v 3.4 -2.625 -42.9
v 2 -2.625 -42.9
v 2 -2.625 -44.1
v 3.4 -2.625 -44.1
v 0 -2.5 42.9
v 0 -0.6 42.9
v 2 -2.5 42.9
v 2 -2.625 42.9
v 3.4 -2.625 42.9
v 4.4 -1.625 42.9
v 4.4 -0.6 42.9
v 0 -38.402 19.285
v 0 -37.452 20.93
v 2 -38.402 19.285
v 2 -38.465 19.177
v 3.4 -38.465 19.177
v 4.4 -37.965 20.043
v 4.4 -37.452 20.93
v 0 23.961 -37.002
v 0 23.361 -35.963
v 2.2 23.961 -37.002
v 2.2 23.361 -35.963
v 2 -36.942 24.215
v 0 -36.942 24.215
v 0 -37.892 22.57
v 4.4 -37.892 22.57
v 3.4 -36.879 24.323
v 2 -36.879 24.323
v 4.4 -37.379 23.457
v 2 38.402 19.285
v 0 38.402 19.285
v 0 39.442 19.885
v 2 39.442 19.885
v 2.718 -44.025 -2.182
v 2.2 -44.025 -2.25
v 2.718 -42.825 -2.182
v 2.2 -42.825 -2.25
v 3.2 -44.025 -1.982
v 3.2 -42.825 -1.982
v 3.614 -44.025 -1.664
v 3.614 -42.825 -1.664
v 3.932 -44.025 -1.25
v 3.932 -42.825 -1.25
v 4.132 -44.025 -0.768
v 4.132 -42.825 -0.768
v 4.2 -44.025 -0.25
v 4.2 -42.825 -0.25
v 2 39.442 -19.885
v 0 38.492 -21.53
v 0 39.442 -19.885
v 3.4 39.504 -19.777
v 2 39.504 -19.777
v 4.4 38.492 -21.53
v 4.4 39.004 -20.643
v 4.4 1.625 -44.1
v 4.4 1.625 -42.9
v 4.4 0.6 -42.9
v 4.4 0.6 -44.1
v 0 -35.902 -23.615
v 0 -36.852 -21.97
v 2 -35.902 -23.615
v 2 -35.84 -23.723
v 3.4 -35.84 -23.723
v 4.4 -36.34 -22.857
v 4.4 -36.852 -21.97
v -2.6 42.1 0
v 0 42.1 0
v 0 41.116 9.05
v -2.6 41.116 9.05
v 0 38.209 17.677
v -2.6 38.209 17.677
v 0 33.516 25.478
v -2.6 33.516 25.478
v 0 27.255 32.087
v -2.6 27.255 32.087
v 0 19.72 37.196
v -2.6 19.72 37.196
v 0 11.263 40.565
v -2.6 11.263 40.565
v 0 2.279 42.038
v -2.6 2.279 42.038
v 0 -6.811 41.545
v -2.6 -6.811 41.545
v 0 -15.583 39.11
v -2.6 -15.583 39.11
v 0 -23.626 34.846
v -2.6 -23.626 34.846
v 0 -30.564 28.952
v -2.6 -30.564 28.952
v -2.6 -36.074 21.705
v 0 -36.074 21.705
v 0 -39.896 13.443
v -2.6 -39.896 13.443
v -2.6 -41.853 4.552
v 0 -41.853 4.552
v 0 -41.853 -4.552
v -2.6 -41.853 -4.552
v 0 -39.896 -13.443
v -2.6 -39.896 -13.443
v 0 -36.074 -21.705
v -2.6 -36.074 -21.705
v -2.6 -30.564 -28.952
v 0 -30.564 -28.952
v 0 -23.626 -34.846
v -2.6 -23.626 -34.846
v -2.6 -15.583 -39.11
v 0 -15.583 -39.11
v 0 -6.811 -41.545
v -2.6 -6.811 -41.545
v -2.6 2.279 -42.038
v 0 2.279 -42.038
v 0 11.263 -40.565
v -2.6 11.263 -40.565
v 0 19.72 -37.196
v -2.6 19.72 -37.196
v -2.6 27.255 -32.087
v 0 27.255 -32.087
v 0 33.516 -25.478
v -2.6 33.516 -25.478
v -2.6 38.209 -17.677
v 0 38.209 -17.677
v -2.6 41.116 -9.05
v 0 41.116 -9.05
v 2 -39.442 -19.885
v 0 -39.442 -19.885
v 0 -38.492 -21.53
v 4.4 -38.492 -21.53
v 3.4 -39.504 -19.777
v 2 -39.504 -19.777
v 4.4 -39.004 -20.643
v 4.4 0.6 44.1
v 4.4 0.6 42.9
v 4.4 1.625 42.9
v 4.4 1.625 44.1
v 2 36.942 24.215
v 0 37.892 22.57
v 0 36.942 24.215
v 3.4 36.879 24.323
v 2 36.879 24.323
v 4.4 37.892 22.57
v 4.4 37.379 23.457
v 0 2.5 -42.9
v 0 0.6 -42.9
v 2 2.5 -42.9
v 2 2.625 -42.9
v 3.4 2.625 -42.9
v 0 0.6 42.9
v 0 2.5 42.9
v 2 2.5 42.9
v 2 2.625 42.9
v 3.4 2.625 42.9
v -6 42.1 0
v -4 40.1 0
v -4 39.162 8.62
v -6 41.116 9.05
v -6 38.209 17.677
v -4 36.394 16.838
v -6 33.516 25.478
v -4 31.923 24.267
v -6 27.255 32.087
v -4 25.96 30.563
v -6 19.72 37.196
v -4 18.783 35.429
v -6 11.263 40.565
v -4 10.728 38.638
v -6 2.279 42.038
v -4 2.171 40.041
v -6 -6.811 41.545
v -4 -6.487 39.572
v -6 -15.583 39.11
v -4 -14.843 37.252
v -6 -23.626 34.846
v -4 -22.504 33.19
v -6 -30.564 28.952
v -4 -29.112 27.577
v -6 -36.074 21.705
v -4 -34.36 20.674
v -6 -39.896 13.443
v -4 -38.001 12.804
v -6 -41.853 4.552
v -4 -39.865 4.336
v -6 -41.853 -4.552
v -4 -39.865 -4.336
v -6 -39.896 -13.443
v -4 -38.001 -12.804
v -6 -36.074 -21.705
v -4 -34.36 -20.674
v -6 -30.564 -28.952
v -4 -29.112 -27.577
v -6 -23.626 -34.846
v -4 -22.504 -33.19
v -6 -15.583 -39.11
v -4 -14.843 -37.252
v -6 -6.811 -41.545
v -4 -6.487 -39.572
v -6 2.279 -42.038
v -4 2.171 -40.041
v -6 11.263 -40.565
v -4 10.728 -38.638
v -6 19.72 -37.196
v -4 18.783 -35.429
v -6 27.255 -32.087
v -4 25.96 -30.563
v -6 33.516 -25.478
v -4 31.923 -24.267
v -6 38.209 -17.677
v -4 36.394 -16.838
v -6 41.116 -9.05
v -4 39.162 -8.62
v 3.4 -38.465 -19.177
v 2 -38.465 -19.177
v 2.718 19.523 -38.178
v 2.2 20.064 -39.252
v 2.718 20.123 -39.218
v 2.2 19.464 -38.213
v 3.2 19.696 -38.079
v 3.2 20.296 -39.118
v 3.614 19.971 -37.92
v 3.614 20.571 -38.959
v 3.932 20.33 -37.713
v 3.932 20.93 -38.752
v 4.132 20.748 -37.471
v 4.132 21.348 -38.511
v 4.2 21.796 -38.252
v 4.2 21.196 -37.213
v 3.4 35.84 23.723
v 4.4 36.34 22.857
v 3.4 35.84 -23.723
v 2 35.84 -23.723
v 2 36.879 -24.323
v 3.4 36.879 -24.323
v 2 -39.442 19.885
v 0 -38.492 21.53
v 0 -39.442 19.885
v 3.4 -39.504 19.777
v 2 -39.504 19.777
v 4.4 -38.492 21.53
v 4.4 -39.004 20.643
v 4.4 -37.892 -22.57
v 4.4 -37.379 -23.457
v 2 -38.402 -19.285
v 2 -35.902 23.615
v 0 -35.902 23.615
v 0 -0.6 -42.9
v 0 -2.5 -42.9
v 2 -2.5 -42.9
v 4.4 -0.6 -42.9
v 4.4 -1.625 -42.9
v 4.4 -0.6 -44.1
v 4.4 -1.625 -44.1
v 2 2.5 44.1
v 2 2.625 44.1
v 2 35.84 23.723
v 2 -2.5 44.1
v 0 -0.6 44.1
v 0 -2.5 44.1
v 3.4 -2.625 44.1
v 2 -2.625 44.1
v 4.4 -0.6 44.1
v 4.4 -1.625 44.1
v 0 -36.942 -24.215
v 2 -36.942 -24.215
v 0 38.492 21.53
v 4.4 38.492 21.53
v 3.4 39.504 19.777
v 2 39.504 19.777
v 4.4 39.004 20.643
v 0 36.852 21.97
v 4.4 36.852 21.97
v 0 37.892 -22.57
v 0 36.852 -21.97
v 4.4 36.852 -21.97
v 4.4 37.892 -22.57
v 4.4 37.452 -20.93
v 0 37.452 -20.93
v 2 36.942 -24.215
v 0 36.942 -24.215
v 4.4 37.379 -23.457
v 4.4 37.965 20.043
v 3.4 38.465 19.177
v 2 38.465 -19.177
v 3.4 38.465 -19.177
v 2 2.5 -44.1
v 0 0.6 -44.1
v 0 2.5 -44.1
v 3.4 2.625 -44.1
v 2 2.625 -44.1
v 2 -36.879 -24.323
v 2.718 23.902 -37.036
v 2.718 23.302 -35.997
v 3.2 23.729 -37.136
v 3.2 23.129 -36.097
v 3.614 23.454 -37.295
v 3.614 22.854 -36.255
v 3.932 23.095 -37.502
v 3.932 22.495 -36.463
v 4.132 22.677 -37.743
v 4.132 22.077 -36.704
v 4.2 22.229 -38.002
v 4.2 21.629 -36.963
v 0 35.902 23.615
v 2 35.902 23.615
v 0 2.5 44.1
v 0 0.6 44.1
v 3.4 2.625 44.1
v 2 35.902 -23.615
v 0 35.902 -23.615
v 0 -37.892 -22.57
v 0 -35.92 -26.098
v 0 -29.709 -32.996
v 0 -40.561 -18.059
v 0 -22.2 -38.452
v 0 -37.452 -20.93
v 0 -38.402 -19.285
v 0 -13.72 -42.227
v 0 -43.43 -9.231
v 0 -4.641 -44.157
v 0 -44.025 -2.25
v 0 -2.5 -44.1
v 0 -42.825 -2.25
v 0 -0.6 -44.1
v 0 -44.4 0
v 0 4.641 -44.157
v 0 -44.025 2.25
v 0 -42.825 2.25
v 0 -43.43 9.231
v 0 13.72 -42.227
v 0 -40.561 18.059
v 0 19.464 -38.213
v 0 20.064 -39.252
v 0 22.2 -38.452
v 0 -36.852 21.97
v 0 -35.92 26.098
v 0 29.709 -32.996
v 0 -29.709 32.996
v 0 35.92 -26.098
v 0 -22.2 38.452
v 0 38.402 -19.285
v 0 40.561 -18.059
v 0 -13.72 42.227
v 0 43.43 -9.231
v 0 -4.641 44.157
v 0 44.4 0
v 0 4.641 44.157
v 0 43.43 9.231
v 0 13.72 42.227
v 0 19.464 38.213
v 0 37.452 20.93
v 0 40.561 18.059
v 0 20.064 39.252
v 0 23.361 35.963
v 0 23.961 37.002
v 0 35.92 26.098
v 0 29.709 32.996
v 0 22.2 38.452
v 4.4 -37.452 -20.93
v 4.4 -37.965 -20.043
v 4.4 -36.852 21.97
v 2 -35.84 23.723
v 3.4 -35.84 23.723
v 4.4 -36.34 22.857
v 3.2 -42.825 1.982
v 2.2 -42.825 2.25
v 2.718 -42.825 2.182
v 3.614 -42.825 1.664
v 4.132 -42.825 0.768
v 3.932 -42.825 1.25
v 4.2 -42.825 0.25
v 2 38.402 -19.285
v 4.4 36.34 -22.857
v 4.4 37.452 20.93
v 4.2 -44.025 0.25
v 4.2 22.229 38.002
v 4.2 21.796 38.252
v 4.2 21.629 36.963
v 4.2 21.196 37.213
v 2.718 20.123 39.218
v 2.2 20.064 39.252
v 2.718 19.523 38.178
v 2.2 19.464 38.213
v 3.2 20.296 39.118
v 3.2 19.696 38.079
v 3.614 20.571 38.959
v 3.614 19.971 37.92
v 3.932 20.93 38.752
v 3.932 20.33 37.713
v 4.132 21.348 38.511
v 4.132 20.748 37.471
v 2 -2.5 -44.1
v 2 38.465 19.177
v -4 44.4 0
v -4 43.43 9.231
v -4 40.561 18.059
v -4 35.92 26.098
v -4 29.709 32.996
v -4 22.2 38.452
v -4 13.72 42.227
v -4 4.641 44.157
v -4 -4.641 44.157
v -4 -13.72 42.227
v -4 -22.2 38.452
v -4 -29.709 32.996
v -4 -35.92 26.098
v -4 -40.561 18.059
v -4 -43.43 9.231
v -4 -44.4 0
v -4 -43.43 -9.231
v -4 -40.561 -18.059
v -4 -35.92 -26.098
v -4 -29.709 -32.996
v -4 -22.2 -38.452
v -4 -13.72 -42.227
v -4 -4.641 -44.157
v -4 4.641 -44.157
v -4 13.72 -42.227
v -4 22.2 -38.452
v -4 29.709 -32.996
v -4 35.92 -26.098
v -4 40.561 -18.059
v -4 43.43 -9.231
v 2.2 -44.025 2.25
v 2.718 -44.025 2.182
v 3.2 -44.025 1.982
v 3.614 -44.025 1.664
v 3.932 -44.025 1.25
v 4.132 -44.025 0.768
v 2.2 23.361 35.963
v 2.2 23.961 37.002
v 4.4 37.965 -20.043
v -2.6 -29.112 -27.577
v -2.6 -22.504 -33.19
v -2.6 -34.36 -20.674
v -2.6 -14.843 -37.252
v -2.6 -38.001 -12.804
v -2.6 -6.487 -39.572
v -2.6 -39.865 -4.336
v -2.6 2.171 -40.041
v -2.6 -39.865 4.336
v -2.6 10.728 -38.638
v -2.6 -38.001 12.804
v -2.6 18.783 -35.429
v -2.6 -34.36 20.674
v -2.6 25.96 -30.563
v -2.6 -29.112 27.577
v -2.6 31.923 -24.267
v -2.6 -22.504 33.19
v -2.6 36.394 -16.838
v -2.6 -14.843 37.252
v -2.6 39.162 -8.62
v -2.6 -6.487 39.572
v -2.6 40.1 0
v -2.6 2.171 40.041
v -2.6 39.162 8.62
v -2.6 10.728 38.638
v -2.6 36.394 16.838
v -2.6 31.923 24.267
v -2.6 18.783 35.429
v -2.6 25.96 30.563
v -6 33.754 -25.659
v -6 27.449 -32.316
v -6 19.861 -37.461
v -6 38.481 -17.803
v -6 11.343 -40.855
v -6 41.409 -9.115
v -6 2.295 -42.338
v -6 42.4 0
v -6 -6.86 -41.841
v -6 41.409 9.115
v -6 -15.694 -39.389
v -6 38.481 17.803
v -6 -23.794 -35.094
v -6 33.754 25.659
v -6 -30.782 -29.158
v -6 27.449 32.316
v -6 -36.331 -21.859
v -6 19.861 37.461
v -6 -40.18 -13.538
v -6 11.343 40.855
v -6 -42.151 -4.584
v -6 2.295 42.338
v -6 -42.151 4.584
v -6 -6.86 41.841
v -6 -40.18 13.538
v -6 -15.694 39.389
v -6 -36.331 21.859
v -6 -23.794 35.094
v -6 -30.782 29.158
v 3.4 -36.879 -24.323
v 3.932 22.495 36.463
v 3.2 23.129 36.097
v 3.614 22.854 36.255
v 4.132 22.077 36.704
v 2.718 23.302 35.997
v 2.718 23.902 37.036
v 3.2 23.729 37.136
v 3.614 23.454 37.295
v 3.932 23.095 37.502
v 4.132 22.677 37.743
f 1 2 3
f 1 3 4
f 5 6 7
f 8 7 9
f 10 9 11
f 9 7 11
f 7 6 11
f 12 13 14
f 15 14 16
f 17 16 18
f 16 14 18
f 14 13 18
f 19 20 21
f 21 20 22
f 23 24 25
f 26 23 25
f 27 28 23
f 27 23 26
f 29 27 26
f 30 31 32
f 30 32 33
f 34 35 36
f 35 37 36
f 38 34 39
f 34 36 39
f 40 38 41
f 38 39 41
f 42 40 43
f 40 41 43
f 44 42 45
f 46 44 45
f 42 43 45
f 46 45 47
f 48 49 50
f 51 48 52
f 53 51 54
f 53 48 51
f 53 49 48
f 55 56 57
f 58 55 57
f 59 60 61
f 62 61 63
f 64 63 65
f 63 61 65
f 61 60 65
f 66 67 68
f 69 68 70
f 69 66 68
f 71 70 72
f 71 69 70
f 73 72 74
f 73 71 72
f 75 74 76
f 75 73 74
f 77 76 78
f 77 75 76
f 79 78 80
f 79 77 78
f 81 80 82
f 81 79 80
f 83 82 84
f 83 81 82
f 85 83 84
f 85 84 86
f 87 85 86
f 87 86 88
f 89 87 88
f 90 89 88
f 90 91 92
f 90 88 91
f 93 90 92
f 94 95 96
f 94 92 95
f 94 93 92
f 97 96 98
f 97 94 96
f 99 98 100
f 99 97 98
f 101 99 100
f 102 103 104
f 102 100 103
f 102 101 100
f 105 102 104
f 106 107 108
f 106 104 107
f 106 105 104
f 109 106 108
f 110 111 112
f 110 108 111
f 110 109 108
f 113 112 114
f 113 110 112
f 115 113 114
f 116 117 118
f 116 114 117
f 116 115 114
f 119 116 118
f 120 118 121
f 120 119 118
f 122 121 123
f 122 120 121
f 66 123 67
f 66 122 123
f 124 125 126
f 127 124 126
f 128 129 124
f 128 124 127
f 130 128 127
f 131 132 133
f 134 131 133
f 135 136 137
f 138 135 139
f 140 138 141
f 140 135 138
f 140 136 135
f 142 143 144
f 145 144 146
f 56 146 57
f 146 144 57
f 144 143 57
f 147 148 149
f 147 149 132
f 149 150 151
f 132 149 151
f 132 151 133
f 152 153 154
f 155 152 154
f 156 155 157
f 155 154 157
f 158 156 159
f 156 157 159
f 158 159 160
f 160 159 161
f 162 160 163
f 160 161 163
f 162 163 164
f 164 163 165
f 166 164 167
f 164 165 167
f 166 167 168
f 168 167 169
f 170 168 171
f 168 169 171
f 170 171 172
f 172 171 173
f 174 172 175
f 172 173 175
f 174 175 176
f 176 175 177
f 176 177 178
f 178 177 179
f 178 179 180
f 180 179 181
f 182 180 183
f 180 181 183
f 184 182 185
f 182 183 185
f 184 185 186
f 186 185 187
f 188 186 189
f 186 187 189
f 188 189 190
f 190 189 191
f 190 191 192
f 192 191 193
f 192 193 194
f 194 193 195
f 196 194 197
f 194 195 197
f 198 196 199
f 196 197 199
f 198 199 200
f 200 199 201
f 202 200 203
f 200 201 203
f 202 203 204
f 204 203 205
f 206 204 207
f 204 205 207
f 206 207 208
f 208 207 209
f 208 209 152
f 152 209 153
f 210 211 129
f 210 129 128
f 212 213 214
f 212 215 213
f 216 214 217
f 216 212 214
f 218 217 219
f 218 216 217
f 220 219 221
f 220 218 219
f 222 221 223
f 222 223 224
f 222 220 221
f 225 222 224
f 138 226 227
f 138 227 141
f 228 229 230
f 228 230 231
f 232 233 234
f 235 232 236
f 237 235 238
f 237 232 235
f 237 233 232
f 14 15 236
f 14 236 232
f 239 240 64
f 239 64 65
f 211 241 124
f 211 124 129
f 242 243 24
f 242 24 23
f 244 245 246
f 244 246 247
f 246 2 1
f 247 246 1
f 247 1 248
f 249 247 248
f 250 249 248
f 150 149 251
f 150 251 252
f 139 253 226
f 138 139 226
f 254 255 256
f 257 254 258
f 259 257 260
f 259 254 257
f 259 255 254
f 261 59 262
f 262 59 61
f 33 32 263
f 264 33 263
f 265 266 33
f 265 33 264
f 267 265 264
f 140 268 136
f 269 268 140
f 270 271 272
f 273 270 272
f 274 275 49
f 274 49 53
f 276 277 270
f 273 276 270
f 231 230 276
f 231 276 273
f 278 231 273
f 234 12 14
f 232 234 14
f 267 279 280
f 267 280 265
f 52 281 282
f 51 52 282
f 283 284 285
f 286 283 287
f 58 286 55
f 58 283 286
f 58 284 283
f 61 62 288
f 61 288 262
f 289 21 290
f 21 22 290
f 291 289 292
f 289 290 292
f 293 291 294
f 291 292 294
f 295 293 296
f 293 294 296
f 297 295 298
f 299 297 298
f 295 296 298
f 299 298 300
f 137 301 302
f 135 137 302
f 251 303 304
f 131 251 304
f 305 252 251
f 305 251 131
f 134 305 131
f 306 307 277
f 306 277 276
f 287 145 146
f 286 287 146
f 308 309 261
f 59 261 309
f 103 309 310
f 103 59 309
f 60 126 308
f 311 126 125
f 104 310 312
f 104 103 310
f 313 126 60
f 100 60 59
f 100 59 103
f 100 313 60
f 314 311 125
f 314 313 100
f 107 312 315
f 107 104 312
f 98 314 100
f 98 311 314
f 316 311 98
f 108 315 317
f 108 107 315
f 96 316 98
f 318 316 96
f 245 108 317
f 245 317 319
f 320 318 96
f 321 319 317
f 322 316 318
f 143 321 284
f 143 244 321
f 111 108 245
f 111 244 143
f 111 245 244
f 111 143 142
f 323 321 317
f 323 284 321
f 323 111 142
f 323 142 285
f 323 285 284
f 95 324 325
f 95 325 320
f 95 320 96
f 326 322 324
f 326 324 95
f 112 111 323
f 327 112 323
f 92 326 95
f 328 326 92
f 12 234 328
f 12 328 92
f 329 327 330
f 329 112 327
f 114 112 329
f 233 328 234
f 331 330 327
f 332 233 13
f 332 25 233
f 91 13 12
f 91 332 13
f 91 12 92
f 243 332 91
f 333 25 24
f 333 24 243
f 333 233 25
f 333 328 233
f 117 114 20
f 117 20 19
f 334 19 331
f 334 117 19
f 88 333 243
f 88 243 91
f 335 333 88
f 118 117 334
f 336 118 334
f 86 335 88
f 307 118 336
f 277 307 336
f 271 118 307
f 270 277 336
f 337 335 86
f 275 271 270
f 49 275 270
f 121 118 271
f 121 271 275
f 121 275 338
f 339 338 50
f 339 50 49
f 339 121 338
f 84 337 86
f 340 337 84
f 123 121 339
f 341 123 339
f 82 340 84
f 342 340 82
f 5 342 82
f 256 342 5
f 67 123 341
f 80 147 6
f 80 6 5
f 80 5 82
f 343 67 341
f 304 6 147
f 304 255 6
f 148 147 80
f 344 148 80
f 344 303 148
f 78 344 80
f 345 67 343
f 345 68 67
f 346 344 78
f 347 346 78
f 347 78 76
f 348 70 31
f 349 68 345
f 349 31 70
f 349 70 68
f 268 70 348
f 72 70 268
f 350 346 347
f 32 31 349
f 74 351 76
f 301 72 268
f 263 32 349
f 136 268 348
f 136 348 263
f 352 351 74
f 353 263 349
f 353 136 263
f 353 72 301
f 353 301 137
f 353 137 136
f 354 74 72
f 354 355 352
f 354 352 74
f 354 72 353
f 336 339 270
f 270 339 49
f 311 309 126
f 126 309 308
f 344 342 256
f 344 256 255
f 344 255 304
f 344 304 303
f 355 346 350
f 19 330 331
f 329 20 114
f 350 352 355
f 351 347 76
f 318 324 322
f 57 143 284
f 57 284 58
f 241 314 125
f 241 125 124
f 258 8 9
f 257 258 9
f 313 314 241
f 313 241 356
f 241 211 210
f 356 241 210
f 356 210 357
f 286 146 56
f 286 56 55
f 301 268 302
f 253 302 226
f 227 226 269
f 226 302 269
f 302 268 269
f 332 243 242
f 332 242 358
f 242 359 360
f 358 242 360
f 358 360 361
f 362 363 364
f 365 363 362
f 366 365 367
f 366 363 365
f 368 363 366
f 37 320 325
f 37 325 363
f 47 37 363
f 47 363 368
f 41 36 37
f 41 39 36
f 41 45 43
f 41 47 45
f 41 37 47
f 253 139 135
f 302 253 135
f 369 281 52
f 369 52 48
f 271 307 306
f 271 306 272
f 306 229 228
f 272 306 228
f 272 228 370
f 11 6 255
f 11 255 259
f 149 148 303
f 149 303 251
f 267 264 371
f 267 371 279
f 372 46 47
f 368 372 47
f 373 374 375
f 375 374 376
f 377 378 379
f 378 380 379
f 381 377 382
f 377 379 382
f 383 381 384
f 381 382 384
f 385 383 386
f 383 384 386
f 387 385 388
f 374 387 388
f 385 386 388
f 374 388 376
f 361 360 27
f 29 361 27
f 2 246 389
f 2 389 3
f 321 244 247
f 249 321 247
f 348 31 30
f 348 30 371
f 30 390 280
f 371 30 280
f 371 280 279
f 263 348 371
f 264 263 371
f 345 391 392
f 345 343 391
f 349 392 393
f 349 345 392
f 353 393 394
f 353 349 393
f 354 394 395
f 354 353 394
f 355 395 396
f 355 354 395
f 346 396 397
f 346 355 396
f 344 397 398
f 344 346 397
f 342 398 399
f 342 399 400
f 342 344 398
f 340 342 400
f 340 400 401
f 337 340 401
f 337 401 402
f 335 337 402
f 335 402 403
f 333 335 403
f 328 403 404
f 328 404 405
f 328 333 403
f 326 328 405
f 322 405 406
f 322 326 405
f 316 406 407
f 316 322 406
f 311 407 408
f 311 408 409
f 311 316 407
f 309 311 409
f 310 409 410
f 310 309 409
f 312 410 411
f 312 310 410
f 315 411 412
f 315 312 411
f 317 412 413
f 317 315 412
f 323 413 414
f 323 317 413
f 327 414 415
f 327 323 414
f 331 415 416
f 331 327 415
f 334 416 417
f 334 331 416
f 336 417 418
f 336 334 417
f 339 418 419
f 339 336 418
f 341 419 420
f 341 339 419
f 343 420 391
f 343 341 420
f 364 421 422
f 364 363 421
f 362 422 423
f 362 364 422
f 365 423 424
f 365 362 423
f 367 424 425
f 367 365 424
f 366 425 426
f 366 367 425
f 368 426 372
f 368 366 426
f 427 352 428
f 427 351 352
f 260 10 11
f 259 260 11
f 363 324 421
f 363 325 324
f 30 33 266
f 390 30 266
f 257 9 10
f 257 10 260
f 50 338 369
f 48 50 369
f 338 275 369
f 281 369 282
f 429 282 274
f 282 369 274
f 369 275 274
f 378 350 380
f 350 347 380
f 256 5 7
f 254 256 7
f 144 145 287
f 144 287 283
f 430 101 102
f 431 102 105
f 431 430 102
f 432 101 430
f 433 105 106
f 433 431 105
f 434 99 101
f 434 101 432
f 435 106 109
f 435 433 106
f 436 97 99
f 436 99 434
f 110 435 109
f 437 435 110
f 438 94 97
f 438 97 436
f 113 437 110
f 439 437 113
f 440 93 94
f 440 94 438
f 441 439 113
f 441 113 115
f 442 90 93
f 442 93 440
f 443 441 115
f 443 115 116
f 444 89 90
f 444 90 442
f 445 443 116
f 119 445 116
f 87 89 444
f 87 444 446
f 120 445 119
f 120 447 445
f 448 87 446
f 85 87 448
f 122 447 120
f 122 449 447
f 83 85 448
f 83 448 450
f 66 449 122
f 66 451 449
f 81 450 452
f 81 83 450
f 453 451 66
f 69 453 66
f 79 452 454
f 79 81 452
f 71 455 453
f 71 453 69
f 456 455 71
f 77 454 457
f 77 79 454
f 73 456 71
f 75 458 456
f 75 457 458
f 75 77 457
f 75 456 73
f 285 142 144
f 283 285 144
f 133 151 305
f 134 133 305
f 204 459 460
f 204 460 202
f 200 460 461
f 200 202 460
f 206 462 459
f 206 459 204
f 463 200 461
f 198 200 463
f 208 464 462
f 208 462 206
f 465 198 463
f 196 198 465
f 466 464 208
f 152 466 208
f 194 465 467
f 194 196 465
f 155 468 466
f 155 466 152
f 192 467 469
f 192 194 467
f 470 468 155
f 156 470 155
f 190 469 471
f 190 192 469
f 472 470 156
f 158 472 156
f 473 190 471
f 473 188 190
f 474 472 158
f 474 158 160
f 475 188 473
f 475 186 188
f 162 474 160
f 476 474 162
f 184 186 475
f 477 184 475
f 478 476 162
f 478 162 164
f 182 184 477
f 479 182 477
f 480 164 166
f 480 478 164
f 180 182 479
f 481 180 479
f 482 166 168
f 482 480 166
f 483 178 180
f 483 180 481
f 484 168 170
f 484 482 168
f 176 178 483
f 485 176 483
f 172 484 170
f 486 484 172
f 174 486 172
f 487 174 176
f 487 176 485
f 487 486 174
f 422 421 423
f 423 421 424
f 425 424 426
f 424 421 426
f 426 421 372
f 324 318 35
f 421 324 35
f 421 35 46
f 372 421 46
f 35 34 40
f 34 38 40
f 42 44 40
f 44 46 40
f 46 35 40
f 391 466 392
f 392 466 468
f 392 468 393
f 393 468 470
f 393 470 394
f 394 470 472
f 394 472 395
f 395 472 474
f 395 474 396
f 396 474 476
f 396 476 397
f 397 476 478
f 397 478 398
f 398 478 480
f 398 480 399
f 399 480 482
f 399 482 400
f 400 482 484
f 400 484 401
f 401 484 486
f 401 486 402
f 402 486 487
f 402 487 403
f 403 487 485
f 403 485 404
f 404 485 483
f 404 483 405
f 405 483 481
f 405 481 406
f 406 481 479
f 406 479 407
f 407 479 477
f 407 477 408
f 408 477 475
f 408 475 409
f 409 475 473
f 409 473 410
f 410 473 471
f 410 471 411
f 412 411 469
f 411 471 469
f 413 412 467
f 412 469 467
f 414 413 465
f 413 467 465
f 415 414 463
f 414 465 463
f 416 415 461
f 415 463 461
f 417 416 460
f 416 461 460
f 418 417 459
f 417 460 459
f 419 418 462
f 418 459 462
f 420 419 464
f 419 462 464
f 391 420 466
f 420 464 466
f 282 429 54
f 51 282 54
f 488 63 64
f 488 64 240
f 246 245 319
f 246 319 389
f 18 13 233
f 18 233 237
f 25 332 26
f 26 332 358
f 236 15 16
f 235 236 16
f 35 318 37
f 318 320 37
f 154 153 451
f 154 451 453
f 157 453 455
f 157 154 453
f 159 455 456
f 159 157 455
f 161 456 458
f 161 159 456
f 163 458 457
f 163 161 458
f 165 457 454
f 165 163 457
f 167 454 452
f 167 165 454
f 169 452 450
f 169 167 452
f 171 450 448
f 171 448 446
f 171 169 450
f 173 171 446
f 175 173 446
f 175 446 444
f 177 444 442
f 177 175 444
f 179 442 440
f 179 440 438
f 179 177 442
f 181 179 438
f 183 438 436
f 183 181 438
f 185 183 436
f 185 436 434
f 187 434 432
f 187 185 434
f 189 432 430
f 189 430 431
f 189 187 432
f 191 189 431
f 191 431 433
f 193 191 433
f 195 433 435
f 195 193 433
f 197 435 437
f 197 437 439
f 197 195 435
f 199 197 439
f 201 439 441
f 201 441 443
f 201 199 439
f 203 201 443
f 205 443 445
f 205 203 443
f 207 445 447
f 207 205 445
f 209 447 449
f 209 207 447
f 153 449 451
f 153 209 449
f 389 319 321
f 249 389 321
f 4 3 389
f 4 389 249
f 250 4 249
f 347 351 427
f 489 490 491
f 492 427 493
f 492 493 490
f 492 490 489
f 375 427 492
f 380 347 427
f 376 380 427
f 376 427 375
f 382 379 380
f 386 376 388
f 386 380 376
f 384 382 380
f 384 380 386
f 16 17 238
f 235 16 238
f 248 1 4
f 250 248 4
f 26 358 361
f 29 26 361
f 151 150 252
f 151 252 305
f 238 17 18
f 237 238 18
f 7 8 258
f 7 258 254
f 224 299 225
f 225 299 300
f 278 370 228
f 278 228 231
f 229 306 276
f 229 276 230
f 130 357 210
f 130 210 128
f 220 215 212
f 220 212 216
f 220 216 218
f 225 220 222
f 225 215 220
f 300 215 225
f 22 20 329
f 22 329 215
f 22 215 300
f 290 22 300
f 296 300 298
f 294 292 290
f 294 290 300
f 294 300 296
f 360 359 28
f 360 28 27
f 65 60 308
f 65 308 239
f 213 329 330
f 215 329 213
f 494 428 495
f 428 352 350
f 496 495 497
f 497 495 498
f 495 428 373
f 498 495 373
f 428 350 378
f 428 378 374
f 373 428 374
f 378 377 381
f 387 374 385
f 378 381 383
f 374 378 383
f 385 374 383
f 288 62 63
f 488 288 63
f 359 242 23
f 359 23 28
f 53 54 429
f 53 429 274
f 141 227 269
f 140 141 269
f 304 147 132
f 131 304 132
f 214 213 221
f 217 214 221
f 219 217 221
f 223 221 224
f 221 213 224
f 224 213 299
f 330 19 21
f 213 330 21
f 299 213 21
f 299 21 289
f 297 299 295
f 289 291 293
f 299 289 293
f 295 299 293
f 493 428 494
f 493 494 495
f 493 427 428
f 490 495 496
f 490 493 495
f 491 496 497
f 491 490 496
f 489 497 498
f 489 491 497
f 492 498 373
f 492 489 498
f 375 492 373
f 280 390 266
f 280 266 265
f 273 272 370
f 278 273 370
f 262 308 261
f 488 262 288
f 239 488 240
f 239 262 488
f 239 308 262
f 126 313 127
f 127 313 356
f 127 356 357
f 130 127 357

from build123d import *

# Parameters (mm, degrees)
BOX003_W        = 2
BOX003_H        = 3
BOX003_DEPTH    = 10
ARRAY004_COUNT  = 6
BOX004_W        = 2
BOX004_H        = 3
BOX004_DEPTH    = 10
ARRAY003_COUNT  = 6
BOX001_W        = 5
BOX001_H        = 1.2
BOX001_DEPTH    = 10
ARRAY002_COUNT  = 6
CHAMFER_SIZE    = 2
CHAMFER001_SIZE = 2
BOX002_W        = 4.2
BOX002_H        = 1.2
BOX002_DEPTH    = 4.5
ARRAY_COUNT     = 3
BOX_W           = 4.4
BOX_H           = 5.25
BOX_DEPTH       = 1.2
ARRAY001_COUNT  = 6
CHAMFER002_SIZE = 1
FILLET_R        = 2


with BuildPart() as array004:
    # Box003 → Box003 (new body)
    with BuildSketch(Plane(origin=(0, -5.5, 38), x_dir=(1, 0, 0), z_dir=(0, 0, 1))):
        with Locations((1, 1.5)):
            Rectangle(BOX003_W, BOX003_H)
    extrude(amount=BOX003_DEPTH)

    # Array004: Array004 ×6 about axis
    array004_axis = Axis((0, 0, 0), (1, 0, 0))


with BuildPart() as array004_1:
    add(array004.part)
    for i in range(1, ARRAY004_COUNT):
        add(array004.part.rotate(array004_axis, i * 360 / ARRAY004_COUNT))


with BuildPart() as array003:
    # Box004 → Box004 (new body)
    with BuildSketch(Plane(origin=(0, 2.5, 38), x_dir=(1, 0, 0), z_dir=(0, 0, 1))):
        with Locations((1, 1.5)):
            Rectangle(BOX004_W, BOX004_H)
    extrude(amount=BOX004_DEPTH)

    # Array003: Array003 ×6 about axis
    array003_axis = Axis((0, 0, 0), (1, 0, 0))


with BuildPart() as array003_1:
    add(array003.part)
    for i in range(1, ARRAY003_COUNT):
        add(array003.part.rotate(array003_axis, i * 360 / ARRAY003_COUNT))


with BuildPart() as array002:
    # Box001 → Box001 (new body)
    with BuildSketch(Plane(origin=(0, -0.6, 38), x_dir=(1, 0, 0), z_dir=(0, 0, 1))):
        with Locations((2.5, 0.6)):
            Rectangle(BOX001_W, BOX001_H)
    extrude(amount=BOX001_DEPTH)

    # Array002: Array002 ×6 about axis
    array002_axis = Axis((0, 0, 0), (1, 0, 0))


with BuildPart() as array002_1:
    add(array002.part)
    for i in range(1, ARRAY002_COUNT):
        add(array002.part.rotate(array002_axis, i * 360 / ARRAY002_COUNT))


with BuildPart() as chamfer001:
    # Sketch → Revolution (revolve)
    with BuildSketch(Plane.XY):
        Polygon((-6, 44.4), (0, 44.4), (0, 42.1), (-2.6, 42.1), (-2.6, 40.1), (-6, 40.1), align=None)
    revolve(axis=Axis((0, 0, 0), (1, 0, 0)))

    # Chamfer
    chamfer_edges = [chamfer001.edges().sort_by_distance(p)[0] for p in [
        (-6, -44.4, 0),
    ]]
    chamfer(chamfer_edges, length=CHAMFER_SIZE)

    # Chamfer001
    chamfer001_edges = [chamfer001.edges().sort_by_distance(p)[0] for p in [
        (-6, -40.1, 0),
    ]]
    chamfer(chamfer001_edges, length=CHAMFER001_SIZE)


with BuildPart() as fusion:
    # Box002 → Box002 (new body)
    with BuildSketch(Plane(origin=(0, -44.025, -2.25), x_dir=(1, 0, 0), z_dir=(0, 0, 1))):
        with Locations((2.1, 0.6)):
            Rectangle(BOX002_W, BOX002_H)
    extrude(amount=BOX002_DEPTH)

    # Array: Fusion ×3 about axis
    array_axis = Axis((0, 0, 0), (1, 0, 0))


with BuildPart() as fusion_1:
    add(fusion.part)
    for i in range(1, ARRAY_COUNT):
        add(fusion.part.rotate(array_axis, i * 360 / ARRAY_COUNT))

    # Fusion: union Chamfer001
    add(chamfer001.part)


with BuildPart() as fillet_body:
    # Box → Box (new body)
    with BuildSketch(Plane(origin=(0, -2.625, 42.9), x_dir=(1, 0, 0), z_dir=(0, 0, 1))):
        with Locations((2.2, 2.625)):
            Rectangle(BOX_W, BOX_H)
    extrude(amount=BOX_DEPTH)

    # Array001: Fillet body ×6 about axis
    array001_axis = Axis((0, 0, 0), (1, 0, 0))


with BuildPart() as fillet_body_1:
    add(fillet_body.part)
    for i in range(1, ARRAY001_COUNT):
        add(fillet_body.part.rotate(array001_axis, i * 360 / ARRAY001_COUNT))

    # Fusion001: union Fusion
    add(fusion_1.part)

    # Cut: cut Array002
    add(array002_1.part, mode=Mode.SUBTRACT)

    # Cut001: cut Array003
    add(array003_1.part, mode=Mode.SUBTRACT)

    # Cut002: cut Array004
    add(array004_1.part, mode=Mode.SUBTRACT)

    # Chamfer002
    chamfer002_edges = [fillet_body_1.edges().sort_by_distance(p)[0] for p in [
        (4.4, -38.984605, 19.476683),
        (4.4, -38.984605, -19.476683),
        (4.4, 38.984605, -19.476683),
        (4.4, 36.359605, 24.023317),
        (4.4, 36.359605, -24.023317),
        (4.4, -36.359605, -24.023317),
        (4.4, 38.984605, 19.476683),
        (4.4, -36.359605, 24.023317),
        (4.4, 2.625, -43.5),
        (4.4, -2.625, -43.5),
        (4.4, 2.625, 43.5),
        (4.4, -2.625, 43.5),
    ]]
    chamfer(chamfer002_edges, length=CHAMFER002_SIZE)

    # Fillet
    fillet_edges = [fillet_body_1.edges().sort_by_distance(p)[0] for p in [
        (4.2, 23.661057, 36.482153),
        (4.2, 19.763943, 38.732153),
        (4.2, 19.763943, -38.732153),
        (4.2, 23.661057, -36.482153),
        (4.2, -43.425, 2.25),
        (4.2, -43.425, -2.25),
    ]]
    fillet(fillet_edges, radius=FILLET_R)


solid = fillet_body_1.part
